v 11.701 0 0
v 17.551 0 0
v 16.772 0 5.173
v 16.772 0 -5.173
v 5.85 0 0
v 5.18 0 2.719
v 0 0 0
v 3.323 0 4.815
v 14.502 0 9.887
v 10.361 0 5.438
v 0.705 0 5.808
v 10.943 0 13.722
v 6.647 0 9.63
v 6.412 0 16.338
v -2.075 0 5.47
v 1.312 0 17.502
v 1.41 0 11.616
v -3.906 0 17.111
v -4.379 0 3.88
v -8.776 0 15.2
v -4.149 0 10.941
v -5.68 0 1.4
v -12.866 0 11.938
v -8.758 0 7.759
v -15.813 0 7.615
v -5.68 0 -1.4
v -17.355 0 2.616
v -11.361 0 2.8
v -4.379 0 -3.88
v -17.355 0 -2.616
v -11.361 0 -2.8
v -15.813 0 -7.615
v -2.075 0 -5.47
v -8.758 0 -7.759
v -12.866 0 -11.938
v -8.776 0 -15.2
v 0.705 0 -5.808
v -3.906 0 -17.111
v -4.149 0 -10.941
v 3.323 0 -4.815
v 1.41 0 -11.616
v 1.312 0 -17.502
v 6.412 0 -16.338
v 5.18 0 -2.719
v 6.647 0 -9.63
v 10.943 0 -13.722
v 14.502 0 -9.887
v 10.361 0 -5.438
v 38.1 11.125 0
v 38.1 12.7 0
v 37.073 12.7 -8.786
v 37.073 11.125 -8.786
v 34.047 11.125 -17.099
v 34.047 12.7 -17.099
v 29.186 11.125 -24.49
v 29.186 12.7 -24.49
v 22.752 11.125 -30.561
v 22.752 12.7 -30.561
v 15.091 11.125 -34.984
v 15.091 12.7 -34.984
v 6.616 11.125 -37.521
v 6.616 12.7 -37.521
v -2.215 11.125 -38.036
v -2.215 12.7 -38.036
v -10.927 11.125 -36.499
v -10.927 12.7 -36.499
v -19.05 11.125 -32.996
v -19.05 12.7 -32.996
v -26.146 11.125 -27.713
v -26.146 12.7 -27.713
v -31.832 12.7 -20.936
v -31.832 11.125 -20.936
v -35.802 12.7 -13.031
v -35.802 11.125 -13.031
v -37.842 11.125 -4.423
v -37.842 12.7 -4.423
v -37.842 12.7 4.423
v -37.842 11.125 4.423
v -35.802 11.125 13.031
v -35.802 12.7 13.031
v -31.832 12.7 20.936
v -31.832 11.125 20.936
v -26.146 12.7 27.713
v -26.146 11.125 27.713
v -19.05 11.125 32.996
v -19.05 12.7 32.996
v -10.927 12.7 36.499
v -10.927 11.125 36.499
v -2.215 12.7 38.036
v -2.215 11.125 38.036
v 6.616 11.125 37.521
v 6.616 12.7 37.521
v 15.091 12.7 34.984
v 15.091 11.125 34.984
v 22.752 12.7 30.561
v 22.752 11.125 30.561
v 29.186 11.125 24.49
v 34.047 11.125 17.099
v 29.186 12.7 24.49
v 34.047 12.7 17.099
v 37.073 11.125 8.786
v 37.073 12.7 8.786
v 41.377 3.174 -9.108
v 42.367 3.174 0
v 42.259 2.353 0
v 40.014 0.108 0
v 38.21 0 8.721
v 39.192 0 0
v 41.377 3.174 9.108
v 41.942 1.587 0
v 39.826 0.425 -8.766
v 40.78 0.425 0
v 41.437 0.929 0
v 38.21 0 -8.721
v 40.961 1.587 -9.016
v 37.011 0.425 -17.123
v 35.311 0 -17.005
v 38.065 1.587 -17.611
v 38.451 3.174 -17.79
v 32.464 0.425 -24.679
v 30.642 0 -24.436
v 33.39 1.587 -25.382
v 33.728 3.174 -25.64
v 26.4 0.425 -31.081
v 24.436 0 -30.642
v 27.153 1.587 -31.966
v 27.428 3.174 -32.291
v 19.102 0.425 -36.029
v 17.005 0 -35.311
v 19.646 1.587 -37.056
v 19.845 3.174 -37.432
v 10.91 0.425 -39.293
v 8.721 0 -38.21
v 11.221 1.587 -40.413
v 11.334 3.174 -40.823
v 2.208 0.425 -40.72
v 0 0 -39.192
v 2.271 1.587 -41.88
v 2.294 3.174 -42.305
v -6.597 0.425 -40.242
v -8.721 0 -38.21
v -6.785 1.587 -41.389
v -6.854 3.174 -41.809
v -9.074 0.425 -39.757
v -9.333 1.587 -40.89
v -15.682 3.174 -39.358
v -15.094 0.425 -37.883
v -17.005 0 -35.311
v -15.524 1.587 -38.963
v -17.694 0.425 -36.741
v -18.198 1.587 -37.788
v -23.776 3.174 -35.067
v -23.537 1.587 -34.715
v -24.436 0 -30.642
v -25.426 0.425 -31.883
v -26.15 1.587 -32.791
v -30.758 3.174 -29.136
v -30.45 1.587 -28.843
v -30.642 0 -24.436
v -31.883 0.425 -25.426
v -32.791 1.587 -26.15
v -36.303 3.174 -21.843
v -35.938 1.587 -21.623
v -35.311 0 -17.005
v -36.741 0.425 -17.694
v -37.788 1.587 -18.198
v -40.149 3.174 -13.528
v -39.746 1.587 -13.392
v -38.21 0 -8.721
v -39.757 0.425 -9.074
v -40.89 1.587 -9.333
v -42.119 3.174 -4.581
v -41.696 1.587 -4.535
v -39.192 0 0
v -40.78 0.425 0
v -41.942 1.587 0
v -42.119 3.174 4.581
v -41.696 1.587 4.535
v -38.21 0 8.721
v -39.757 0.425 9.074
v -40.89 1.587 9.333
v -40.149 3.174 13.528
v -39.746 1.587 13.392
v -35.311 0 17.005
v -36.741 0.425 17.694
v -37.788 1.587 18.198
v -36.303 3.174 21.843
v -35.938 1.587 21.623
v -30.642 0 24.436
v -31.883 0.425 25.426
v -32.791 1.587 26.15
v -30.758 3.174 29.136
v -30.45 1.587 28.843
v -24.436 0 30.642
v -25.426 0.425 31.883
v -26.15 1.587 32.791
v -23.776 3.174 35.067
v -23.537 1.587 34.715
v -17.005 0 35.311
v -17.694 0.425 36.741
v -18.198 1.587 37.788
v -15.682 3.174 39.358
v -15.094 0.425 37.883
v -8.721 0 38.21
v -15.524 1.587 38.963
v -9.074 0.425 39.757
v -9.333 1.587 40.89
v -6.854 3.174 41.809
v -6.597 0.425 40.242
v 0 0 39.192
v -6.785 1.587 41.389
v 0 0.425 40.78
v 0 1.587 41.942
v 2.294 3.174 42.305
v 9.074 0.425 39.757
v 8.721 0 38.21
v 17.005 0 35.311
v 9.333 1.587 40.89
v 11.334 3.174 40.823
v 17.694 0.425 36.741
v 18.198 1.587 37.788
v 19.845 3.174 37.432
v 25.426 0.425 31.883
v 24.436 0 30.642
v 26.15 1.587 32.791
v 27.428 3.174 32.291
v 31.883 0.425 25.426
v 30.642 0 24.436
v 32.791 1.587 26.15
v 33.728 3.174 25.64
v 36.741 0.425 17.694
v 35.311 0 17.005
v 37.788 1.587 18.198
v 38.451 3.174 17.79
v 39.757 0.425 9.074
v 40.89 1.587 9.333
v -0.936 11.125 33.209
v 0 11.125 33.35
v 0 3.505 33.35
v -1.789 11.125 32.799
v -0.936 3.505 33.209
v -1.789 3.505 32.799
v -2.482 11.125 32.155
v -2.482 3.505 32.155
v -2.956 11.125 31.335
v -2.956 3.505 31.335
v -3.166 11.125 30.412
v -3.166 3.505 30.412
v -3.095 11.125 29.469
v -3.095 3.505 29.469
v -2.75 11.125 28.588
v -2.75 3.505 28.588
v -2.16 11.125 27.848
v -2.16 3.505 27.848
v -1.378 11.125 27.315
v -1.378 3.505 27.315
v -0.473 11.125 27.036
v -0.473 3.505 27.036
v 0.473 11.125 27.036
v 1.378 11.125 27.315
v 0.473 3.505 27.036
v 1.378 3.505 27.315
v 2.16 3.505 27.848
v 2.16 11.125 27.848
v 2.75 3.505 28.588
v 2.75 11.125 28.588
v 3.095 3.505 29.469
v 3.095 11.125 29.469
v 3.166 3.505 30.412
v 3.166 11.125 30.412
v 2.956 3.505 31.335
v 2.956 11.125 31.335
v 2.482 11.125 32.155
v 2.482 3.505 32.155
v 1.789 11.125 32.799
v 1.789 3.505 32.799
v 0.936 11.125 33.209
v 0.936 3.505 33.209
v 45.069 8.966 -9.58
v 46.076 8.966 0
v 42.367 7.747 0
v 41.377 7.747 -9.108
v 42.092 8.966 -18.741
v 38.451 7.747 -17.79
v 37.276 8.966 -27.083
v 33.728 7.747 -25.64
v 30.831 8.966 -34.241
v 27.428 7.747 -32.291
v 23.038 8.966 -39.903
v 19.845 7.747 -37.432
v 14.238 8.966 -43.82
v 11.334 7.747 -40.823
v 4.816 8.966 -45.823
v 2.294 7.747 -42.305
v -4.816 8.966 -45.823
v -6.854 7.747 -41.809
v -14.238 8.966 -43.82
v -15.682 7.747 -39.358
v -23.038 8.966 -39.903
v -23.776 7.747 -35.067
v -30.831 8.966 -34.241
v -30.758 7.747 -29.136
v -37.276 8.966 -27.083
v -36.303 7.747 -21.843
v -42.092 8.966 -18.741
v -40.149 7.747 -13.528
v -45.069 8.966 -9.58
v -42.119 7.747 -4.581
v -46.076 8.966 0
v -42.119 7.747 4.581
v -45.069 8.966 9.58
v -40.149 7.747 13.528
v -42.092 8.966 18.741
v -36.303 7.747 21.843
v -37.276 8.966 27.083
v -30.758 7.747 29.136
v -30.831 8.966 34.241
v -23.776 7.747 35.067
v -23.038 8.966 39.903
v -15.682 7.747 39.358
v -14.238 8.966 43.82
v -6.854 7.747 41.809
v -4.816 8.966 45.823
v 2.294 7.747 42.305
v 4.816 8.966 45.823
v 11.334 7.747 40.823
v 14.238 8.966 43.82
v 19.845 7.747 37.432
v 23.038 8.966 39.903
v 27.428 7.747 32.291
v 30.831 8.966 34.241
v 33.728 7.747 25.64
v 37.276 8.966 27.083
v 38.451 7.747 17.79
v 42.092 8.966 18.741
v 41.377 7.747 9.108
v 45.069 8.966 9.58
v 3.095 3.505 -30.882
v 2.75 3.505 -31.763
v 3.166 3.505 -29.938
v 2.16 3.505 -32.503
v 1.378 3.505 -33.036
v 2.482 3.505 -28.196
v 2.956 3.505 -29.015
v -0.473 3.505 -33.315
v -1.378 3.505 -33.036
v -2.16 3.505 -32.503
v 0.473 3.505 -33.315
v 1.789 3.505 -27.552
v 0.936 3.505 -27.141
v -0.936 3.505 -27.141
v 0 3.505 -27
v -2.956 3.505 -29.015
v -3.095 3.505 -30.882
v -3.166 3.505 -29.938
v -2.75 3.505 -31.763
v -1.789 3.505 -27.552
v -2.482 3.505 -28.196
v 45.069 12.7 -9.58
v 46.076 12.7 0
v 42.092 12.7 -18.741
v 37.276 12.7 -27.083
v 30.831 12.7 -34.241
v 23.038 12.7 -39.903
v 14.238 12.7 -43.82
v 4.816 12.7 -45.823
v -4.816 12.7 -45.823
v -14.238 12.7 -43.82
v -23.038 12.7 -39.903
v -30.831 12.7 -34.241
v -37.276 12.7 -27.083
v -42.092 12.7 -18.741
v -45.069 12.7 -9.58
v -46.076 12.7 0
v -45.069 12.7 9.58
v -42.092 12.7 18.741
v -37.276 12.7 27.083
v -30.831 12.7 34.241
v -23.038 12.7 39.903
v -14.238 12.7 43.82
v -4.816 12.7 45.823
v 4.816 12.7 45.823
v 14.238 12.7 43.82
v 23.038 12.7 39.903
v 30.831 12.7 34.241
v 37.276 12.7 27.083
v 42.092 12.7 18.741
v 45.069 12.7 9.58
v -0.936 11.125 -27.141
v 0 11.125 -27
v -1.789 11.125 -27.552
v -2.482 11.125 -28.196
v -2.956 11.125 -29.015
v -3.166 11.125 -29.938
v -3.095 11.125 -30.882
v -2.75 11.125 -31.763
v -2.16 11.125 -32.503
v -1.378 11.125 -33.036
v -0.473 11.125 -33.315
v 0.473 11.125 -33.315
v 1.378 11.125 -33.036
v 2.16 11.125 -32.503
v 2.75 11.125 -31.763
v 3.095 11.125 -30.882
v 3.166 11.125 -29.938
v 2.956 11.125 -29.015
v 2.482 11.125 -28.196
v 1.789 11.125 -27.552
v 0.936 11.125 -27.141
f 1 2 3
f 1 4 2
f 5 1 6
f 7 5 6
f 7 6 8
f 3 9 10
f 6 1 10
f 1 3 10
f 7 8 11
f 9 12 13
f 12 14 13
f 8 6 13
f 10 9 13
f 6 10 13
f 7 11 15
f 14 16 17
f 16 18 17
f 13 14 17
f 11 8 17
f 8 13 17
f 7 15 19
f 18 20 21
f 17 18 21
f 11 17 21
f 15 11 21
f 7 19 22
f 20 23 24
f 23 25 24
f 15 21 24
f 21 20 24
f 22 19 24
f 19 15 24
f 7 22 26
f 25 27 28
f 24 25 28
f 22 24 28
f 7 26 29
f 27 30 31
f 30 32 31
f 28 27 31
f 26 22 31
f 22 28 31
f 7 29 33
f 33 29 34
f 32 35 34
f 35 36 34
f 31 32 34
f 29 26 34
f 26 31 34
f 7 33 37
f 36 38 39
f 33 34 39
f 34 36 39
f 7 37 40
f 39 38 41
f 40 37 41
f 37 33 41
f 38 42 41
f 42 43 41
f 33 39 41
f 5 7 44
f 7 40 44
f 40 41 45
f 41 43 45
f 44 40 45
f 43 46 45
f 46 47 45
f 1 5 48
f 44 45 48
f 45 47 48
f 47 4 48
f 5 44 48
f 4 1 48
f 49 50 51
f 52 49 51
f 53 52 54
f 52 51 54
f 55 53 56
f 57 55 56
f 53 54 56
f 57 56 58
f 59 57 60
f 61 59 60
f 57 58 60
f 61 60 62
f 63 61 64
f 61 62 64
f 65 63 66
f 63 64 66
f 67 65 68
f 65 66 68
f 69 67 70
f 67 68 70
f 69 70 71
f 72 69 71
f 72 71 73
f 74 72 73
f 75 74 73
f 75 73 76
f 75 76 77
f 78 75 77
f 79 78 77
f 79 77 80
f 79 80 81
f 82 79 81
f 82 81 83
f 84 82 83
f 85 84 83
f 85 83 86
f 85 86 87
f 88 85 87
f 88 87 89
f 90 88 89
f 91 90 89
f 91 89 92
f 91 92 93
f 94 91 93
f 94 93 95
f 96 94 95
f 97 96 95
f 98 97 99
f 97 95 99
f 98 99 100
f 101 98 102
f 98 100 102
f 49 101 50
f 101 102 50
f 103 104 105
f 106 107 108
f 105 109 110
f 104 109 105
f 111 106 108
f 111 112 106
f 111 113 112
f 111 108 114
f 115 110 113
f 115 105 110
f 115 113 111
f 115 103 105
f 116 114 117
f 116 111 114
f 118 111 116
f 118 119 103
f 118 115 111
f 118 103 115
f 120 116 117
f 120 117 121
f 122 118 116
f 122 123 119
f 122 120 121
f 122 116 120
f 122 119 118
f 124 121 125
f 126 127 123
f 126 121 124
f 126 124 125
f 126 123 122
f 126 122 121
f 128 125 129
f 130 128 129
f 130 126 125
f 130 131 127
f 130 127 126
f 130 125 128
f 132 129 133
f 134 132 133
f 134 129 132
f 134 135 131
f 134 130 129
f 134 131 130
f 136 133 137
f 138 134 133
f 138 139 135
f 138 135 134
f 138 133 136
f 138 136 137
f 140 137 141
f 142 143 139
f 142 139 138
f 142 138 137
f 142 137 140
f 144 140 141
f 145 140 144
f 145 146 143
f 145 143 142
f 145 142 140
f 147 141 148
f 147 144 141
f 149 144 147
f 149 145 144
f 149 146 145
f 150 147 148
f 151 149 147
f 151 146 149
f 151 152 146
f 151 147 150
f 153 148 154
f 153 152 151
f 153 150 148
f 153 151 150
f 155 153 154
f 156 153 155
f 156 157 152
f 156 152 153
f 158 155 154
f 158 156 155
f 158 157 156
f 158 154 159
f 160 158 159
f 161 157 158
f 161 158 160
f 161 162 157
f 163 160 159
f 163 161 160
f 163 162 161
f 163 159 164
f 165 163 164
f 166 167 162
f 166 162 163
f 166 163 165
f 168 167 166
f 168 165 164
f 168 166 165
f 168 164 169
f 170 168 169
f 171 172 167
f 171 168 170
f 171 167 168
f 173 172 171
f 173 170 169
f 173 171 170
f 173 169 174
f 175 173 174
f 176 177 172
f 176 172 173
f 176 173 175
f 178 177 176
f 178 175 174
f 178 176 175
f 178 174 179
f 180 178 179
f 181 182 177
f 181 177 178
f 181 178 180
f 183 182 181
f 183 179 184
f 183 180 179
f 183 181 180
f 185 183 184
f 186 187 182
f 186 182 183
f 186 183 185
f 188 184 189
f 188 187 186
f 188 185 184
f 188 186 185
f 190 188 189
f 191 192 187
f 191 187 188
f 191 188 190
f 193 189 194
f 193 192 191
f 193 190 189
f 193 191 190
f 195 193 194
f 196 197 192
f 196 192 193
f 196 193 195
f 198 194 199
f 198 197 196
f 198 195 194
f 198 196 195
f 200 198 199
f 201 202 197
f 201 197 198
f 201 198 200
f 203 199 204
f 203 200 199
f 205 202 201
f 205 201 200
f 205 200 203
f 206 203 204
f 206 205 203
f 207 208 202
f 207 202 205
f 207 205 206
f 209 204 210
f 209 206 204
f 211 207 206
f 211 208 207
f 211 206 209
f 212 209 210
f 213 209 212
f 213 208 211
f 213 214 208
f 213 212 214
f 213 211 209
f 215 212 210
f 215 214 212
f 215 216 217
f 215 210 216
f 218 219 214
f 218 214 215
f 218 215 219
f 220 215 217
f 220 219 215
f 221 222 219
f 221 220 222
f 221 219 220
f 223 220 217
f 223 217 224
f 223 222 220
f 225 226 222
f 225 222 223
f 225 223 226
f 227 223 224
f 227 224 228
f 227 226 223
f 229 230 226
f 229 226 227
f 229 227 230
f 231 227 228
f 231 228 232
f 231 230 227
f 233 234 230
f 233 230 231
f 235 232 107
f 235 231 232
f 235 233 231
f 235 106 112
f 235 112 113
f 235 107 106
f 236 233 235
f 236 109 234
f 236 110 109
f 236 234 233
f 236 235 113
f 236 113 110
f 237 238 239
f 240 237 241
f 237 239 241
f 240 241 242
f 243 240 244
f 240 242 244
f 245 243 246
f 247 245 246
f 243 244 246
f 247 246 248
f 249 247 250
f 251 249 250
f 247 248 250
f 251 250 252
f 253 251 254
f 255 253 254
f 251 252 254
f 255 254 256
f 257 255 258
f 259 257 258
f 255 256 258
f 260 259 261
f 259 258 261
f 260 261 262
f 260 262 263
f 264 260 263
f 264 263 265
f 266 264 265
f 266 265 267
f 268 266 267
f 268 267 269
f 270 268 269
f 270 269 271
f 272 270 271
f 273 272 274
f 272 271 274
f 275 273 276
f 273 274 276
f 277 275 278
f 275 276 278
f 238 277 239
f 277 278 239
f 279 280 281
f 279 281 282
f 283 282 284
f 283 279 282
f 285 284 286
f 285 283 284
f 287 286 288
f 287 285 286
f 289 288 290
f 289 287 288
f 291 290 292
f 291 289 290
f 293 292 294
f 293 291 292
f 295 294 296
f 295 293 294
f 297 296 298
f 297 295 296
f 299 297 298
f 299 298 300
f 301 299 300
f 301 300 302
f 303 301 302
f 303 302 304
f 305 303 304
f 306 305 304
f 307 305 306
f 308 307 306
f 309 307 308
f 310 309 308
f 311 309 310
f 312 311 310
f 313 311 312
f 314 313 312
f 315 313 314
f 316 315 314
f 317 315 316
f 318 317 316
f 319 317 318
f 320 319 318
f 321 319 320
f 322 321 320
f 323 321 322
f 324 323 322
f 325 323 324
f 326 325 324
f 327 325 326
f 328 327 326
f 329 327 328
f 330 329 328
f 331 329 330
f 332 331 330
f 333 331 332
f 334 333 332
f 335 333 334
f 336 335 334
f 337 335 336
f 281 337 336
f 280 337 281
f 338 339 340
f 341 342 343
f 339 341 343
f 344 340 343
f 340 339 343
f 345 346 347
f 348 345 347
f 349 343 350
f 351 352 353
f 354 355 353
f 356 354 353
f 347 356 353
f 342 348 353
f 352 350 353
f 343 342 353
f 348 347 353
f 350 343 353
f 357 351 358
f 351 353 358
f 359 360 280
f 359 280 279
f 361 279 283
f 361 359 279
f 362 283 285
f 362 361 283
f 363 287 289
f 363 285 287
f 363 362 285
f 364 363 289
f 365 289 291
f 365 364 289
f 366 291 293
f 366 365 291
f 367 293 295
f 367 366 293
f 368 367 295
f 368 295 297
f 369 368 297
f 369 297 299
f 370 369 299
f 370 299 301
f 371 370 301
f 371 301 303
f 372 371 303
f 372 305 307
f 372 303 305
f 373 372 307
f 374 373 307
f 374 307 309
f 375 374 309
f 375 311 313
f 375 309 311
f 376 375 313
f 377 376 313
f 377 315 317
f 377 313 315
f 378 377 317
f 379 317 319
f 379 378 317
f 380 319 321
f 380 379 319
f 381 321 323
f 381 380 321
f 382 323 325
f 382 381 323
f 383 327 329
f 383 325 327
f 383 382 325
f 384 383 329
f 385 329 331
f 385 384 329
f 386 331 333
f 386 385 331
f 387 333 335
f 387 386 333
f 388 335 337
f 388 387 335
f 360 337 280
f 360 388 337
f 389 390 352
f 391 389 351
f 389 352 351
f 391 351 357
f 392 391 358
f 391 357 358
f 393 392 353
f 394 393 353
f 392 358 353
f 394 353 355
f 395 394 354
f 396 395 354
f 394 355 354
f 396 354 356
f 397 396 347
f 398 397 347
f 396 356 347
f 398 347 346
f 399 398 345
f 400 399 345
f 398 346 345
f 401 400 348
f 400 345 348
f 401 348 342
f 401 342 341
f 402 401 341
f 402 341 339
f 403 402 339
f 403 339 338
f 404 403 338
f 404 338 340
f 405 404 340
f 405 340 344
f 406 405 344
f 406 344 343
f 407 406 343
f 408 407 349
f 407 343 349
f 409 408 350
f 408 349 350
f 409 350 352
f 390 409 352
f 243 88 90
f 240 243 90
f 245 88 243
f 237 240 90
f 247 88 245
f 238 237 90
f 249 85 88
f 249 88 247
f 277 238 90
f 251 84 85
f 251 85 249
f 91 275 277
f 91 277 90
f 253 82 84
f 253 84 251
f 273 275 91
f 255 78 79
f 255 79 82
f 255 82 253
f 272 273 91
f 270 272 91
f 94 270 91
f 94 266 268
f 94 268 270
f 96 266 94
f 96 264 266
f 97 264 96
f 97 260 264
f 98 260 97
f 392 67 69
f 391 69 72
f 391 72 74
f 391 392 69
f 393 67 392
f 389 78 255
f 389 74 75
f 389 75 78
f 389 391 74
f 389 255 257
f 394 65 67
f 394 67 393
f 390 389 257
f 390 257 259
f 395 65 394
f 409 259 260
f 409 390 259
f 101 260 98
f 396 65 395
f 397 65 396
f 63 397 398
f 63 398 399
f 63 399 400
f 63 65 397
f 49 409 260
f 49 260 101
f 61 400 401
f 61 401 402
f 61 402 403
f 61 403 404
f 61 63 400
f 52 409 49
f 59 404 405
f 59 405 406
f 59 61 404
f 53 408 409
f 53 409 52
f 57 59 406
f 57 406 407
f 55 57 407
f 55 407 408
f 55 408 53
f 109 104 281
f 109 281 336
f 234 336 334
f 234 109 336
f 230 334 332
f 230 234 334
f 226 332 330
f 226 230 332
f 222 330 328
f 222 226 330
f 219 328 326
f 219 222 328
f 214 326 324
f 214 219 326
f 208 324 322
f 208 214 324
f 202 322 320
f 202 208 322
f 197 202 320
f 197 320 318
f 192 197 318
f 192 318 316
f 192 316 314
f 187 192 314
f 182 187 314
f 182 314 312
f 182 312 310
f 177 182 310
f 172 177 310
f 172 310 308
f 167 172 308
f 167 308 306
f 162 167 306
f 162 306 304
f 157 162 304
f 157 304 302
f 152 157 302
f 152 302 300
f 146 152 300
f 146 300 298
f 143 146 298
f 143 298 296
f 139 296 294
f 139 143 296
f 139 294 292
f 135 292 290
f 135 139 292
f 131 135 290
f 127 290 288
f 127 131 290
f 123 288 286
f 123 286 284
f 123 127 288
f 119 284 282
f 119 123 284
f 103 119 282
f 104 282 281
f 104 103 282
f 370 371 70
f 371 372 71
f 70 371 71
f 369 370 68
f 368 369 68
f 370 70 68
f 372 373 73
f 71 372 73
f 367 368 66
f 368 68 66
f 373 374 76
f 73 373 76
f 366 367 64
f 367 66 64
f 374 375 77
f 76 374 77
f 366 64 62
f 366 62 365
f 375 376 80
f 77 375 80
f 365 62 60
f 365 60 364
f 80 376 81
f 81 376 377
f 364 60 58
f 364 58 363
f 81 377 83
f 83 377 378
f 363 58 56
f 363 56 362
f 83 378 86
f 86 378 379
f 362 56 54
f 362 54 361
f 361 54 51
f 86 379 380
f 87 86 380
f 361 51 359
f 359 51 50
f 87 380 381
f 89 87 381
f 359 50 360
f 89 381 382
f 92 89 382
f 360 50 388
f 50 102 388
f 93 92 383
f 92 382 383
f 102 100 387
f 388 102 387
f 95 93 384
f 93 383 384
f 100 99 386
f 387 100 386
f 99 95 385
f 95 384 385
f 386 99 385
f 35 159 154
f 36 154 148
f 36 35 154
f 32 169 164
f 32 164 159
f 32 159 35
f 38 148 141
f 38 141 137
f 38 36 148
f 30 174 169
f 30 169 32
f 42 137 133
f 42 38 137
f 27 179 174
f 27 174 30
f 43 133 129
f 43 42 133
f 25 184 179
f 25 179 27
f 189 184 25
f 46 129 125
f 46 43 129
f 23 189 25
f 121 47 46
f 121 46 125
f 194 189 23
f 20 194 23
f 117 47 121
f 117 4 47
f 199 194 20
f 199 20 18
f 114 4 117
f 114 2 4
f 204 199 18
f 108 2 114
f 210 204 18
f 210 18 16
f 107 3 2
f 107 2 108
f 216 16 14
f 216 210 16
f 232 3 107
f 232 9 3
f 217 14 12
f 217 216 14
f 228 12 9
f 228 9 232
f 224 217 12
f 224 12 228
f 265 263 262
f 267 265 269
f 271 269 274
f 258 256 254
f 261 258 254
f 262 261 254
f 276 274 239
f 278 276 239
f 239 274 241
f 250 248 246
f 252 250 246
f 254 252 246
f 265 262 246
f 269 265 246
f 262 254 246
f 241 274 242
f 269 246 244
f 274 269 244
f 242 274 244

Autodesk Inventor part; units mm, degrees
ref_plane "YZ Plane" through (0, 0, 0) normal (1, 0, 0) x (0, 1, 0)
ref_plane "XZ Plane" through (0, 0, 0) normal (0, 1, 0) x (-1, 0, 0)
ref_plane "XY Plane" through (0, 0, 0) normal (0, 0, 1) x (1, 0, 0)
sketch "Sketch1" plane through (0, 0, 0) normal (0, 0, 1) x (1, 0, 0)
  line L0 (23.85, -0.0005) -> (46.0756, -0.0005)
  line L1 (46.0756, -0.0005) -> (46.0756, 12.7)
  line L2 (46.0756, 12.7) -> (0, 12.7)
  line L3 (0, 12.7) -> (0, 0)
  line L4 (17.5514, 12.7) -> (17.5514, -0.0005)
  line L5 (46.0756, 8.9662) -> (42.3672, 8.9662)
  line L6 (42.3672, 7.747) -> (42.3672, -0.0005)
  line L7 (46.0756, 7.747) -> (42.3672, 7.747)
  line L8 (46.0756, 8.9662) -> (42.3672, 7.747)
  line L9 (0, 11.1252) -> (0, 12.7)
  line L10 (17.5514, -0.0005) -> (23.85, -0.0005)
  line L11 (23.85, -0.0005) -> (23.85, -0.0005)
  line L12 (23.85, -0.0005) -> (0, -0.0005)
  line L13 (0, -0.0005) -> (0, 0)
  point P0 (17.5514, -0.0005)
  dimension "d0" = 46.0756
  dimension "d1" = 12.7
  dimension "d2" = 17.5514
  dimension "d3" = 3.7338
  dimension "d4" = 42.3672
  dimension "d6" = 4.953
  dimension "d14" = 23.85
  dimension "d15" = 0
revolve "Revolution1" add sketch "Sketch1" angle 360 about axis through (0, 12.7, 0) along (0, -1, 0) contours L10 L4 L2 L1 L8 L6 L0 | L12 L3 L2 L4
sketch "Sketch2" plane through (0, 12.7, 0) normal (0, 1, 0) x (1, 0, 0)
  circle A0 centre (0, 0) radius 38.1
  point P0 (0, 0)
  dimension "d11" = 76.2
extrude "Extrusion1" cut sketch "Sketch2" against normal blind 1.5748
sketch "Sketch5" plane through (0, 11.1252, 0) normal (0, 1, 0) x (1, 0, 0)
  circle A0 centre (0, 0) radius 30.1752
  point P0 (0, 0)
  point P1 (0, 30.1752)
  point P2 (0, -30.1752)
  dimension "d35" = 60.3504
hole "Hole3" at (0, 11.1252, -30.1752) at (0, 11.1252, 30.1752) direction (0, -1, 0) diameter 6.35 depth 7.62
fillet "Fillet1" radius 3.175 1 edges at (-42.3672, -0.0005, 0)
properties part number "2016.06.09 Mount Adapter Blank"
